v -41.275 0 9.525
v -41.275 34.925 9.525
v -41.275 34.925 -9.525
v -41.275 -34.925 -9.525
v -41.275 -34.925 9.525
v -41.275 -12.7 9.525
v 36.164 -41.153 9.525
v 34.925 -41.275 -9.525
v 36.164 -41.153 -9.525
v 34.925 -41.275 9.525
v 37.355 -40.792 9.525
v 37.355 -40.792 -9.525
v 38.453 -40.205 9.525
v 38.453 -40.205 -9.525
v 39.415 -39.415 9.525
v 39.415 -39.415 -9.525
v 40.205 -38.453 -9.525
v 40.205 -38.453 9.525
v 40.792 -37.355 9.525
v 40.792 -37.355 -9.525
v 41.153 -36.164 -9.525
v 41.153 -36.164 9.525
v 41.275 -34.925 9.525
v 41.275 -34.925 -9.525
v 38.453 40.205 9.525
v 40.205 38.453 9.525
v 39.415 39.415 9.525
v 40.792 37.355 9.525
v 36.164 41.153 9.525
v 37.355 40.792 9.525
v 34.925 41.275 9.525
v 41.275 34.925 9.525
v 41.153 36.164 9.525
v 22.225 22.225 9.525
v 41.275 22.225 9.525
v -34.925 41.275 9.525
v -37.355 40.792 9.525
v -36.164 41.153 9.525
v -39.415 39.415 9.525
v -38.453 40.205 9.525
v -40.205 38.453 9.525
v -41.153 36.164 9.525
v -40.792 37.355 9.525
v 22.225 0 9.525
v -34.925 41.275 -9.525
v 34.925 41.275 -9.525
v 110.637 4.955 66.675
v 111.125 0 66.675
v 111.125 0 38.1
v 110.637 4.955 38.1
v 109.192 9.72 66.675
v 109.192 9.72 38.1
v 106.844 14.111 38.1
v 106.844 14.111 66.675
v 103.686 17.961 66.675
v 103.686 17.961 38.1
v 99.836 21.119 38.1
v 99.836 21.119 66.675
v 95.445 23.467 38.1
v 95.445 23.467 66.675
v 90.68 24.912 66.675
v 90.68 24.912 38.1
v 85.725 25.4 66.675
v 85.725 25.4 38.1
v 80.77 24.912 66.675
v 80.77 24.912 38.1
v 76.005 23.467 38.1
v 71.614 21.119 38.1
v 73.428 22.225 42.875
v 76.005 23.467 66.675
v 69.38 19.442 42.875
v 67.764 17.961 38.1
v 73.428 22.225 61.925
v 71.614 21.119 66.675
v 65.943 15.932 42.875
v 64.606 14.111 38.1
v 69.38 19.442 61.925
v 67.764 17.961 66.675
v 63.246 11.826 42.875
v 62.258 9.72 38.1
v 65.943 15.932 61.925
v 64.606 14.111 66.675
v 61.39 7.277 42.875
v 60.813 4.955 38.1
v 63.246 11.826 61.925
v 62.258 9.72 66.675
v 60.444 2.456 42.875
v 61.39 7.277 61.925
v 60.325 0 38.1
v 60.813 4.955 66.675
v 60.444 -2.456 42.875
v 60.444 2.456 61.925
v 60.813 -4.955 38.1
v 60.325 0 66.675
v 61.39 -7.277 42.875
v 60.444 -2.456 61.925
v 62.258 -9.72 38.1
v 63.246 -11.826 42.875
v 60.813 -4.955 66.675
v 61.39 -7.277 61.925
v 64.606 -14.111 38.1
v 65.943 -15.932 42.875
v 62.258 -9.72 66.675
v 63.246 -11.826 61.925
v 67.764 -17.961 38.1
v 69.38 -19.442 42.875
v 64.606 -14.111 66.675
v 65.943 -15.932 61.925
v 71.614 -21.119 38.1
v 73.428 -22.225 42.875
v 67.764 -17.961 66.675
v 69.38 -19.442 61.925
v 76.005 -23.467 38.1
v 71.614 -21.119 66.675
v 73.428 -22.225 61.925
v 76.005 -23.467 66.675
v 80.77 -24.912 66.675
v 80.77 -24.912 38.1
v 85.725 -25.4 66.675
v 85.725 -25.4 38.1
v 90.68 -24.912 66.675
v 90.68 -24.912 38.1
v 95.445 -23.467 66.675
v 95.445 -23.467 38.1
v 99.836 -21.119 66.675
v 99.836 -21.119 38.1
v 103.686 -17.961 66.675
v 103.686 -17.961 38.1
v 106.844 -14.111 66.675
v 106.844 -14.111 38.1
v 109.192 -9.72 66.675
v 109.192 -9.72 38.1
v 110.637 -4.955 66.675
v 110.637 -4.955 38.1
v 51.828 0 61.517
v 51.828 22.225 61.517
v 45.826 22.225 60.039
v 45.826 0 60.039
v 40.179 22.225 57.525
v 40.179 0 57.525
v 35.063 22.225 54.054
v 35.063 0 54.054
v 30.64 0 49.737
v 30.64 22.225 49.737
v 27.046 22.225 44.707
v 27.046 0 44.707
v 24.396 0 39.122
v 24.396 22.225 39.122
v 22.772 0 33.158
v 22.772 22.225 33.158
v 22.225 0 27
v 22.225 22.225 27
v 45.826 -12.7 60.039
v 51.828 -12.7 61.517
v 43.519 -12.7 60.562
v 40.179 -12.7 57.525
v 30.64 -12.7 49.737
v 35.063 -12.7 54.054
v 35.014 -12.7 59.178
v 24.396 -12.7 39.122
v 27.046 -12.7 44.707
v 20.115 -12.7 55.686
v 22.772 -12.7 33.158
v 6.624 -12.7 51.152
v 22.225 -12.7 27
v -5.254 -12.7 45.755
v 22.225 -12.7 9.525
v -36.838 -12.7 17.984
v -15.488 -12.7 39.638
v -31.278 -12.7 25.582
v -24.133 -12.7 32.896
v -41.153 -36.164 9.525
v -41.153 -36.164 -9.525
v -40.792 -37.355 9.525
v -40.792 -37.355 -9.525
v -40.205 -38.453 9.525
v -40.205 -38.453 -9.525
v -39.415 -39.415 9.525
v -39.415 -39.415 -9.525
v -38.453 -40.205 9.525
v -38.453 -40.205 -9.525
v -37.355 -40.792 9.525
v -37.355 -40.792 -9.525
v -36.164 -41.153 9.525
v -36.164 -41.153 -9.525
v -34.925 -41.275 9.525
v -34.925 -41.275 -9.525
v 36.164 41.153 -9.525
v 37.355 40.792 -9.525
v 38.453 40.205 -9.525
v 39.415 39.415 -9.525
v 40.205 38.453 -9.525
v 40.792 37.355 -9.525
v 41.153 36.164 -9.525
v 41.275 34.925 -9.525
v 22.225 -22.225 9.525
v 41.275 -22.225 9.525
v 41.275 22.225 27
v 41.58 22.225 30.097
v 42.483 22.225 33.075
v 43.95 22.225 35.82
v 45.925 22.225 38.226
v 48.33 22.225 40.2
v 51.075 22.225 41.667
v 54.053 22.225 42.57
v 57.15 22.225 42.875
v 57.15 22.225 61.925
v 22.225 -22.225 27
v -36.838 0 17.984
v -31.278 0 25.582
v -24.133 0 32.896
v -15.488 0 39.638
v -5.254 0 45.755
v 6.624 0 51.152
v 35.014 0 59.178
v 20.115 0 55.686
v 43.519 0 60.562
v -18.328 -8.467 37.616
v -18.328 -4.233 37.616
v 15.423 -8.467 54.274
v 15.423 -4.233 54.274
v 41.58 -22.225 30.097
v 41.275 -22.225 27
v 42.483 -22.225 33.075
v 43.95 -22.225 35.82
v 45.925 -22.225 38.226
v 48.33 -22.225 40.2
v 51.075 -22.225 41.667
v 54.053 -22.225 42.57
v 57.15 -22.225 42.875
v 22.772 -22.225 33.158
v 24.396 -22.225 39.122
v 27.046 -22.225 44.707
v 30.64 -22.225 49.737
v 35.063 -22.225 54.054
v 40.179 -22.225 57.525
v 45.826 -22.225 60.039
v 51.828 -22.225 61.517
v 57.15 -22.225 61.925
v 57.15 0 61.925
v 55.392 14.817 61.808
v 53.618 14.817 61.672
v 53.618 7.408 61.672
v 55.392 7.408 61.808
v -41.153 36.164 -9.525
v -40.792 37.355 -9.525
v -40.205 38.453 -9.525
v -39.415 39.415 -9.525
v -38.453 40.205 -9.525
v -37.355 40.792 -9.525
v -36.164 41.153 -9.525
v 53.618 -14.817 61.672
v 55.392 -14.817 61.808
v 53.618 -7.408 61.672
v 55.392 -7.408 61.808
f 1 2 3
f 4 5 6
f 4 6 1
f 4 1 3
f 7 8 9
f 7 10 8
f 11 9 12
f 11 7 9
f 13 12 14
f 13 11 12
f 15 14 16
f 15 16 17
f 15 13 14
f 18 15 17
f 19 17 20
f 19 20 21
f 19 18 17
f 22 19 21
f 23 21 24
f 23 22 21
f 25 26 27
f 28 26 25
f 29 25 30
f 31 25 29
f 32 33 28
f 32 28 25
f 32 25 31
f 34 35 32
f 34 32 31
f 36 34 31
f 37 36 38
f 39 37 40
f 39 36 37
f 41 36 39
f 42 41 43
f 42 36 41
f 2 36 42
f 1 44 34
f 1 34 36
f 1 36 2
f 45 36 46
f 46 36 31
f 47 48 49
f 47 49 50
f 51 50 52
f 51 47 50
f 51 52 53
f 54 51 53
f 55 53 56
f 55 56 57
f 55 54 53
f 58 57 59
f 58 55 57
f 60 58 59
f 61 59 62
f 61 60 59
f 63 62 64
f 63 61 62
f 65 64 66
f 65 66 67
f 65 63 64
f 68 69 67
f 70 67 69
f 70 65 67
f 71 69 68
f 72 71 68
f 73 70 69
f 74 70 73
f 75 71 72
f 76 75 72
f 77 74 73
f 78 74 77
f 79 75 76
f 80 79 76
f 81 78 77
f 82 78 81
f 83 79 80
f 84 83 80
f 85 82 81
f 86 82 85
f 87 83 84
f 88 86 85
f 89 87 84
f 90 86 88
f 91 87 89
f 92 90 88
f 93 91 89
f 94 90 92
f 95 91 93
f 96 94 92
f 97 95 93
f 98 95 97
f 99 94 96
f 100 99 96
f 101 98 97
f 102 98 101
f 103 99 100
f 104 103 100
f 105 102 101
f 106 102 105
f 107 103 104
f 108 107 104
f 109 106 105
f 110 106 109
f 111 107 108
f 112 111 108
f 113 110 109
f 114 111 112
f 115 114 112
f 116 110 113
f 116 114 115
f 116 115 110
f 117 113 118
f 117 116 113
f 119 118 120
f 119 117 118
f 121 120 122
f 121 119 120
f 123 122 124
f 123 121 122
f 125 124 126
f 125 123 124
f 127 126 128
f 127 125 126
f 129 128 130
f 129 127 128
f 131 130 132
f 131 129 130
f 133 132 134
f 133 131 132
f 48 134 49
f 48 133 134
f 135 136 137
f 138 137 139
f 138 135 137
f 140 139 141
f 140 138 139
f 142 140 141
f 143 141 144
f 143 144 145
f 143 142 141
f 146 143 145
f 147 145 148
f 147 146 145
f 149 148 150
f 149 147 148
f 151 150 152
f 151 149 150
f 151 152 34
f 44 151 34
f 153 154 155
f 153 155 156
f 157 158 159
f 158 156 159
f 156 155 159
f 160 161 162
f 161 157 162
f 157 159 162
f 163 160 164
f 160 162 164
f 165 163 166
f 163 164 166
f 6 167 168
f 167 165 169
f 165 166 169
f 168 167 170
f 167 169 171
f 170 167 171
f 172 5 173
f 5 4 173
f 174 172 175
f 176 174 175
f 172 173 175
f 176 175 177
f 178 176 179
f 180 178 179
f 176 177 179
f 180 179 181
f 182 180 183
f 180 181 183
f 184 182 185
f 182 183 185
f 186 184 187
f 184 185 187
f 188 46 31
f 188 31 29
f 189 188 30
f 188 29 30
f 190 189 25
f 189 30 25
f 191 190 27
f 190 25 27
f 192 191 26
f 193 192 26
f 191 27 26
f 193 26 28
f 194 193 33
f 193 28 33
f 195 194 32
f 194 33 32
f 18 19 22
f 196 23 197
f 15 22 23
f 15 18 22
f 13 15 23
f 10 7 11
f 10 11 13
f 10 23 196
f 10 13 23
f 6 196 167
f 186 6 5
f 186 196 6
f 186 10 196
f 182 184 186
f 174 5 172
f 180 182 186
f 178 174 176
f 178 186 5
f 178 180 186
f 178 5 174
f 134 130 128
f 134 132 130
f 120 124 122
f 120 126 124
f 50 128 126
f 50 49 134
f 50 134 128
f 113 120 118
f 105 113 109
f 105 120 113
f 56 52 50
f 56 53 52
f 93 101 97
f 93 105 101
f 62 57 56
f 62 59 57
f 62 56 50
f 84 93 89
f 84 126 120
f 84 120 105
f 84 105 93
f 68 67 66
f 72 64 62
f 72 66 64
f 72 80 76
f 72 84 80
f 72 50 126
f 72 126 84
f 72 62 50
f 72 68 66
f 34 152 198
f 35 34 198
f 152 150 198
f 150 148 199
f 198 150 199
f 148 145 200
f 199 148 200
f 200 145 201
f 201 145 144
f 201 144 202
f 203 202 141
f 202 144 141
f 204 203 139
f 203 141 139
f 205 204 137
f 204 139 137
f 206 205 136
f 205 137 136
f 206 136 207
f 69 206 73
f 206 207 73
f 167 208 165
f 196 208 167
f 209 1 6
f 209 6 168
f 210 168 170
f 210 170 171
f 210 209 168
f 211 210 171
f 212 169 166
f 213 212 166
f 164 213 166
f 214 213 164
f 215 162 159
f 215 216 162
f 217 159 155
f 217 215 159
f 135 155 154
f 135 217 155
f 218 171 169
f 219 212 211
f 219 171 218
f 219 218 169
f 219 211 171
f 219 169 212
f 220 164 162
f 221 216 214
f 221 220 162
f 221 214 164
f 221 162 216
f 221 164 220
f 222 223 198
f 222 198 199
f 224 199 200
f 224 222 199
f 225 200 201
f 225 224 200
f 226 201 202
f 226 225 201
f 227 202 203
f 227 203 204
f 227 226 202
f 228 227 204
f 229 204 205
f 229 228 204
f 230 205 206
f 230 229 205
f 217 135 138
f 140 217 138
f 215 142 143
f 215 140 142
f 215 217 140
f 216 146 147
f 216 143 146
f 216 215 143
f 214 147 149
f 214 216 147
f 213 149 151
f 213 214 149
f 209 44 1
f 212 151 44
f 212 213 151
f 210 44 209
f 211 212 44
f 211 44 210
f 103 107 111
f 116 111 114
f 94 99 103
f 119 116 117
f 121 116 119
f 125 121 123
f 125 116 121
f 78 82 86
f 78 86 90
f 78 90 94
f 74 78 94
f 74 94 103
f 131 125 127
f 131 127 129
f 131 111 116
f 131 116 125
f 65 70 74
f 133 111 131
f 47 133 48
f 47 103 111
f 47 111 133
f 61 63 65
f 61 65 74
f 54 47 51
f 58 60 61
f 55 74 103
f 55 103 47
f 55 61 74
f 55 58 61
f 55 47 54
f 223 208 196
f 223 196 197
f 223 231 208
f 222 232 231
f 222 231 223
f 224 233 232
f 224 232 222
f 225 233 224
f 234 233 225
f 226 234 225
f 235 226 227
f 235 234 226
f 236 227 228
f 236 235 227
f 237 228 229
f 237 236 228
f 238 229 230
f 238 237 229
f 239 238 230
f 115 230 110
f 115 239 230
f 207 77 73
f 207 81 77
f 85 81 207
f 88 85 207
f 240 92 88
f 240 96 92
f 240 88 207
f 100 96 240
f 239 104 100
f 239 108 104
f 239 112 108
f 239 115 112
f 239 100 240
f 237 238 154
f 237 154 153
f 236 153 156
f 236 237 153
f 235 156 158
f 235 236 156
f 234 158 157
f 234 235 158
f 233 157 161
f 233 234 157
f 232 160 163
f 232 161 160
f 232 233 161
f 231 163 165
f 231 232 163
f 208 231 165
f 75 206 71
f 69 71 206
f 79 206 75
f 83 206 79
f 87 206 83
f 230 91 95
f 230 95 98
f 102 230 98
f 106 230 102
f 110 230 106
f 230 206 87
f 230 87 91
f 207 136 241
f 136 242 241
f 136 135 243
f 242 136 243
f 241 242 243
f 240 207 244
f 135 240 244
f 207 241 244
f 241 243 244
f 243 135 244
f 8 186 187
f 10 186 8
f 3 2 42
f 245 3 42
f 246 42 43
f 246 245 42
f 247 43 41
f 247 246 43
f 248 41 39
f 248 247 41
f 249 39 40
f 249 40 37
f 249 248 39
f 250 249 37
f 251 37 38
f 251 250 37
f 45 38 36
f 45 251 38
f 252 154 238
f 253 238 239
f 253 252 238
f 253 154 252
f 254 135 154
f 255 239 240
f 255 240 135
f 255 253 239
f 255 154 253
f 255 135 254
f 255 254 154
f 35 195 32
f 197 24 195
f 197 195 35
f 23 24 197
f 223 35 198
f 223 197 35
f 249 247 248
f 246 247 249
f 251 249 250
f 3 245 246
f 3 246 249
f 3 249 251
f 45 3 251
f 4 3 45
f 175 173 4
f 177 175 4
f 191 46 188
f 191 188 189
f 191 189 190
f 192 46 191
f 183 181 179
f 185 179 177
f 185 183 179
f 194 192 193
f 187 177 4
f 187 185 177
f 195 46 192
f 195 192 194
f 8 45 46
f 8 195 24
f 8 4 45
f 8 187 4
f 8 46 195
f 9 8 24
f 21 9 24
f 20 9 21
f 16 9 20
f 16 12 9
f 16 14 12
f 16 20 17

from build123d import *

# Parameters (mm, degrees)
F1_DEPTH = 41.275
F0_W     = 25.4
F0_H     = 19.05
F2_DEPTH = 22.225
F4_DEPTH = 12.7
F5_R     = 6.35


with BuildPart() as f1:
    # F0 (on Front) → F1 (new body, symmetric)
    with BuildSketch(Plane.XZ):
        Polygon((-41.275, 9.525), (-41.275, -9.525), (41.275, -9.525), (41.275, 9.525), (22.225, 9.525), align=None)
    extrude(amount=F1_DEPTH, both=True)

    # F0 (on Front) → F2 (join, symmetric)
    with BuildSketch(Plane.XZ):
        with BuildLine():
            Line((22.225, 9.525), (41.275, 9.525))
            Line((41.275, 9.525), (41.275, 27.0002))
            ThreePointArc((41.275, 27.0002), (45.9246798487, 38.2255201513), (57.15, 42.8752))
            Line((57.15, 42.8752), (60.325, 42.8752))
            Line((60.325, 42.8752), (60.325, 61.9252))
            Line((60.325, 61.9252), (57.15, 61.9252))
            add(Edge.make_bspline(
                [(51.8284612448, 61.5173964429), (53.6256679067, 61.6821411581), (55.4011666766, 61.8176662229), (57.15, 61.9252)],
                knots=[106.0610091798, 106.0610091798, 106.0610091798, 106.0610091798, 111.5045361635, 111.5045361635, 111.5045361635, 111.5045361635], degree=3))
            ThreePointArc((51.8284612448, 61.5173964429), (30.6395269184, 49.7367441963), (22.225, 27.0002))
            Line((22.225, 27.0002), (22.225, 9.525))
        make_face()
        with Locations((73.025, 52.4002)):
            Rectangle(F0_W, F0_H)
    extrude(amount=F2_DEPTH, both=True)

    # F0 (on Front) → F3 (revolve)
    with BuildSketch(Plane.XZ):
        Polygon((85.725, 66.675), (85.725, 61.9252), (85.725, 42.8752), (85.725, 38.1), (111.125, 38.1), (111.125, 66.675), align=None)
    revolve(axis=Axis((85.725, 0, 54.7751), (0, 0, 1)))

    # F0 (on Front) → F4 (join)
    with BuildSketch(Plane.XZ):
        with BuildLine():
            add(Edge.make_bspline(
                [(-41.275, 9.525), (-26.4454266559, 44.0052587765), (16.8119080386, 58.3075307065), (51.8284612448, 61.5173964429)],
                knots=[0, 0, 0, 0, 106.0610091798, 106.0610091798, 106.0610091798, 106.0610091798], degree=3))
            Line((-41.275, 9.525), (22.225, 9.525))
            Line((22.225, 9.525), (22.225, 27.0002))
            ThreePointArc((22.225, 27.0002), (30.6395269184, 49.7367441963), (51.8284612448, 61.5173964429))
        make_face()
    extrude(amount=F4_DEPTH)

    # F5
    f5_edges = [f1.edges().sort_by_distance(p)[0] for p in [
        (41.275, -41.275, 0),
        (-41.275, -41.275, 0),
        (41.275, 41.275, 0),
        (-41.275, 41.275, 0),
    ]]
    fillet(f5_edges, radius=F5_R)


solid = f1.part
